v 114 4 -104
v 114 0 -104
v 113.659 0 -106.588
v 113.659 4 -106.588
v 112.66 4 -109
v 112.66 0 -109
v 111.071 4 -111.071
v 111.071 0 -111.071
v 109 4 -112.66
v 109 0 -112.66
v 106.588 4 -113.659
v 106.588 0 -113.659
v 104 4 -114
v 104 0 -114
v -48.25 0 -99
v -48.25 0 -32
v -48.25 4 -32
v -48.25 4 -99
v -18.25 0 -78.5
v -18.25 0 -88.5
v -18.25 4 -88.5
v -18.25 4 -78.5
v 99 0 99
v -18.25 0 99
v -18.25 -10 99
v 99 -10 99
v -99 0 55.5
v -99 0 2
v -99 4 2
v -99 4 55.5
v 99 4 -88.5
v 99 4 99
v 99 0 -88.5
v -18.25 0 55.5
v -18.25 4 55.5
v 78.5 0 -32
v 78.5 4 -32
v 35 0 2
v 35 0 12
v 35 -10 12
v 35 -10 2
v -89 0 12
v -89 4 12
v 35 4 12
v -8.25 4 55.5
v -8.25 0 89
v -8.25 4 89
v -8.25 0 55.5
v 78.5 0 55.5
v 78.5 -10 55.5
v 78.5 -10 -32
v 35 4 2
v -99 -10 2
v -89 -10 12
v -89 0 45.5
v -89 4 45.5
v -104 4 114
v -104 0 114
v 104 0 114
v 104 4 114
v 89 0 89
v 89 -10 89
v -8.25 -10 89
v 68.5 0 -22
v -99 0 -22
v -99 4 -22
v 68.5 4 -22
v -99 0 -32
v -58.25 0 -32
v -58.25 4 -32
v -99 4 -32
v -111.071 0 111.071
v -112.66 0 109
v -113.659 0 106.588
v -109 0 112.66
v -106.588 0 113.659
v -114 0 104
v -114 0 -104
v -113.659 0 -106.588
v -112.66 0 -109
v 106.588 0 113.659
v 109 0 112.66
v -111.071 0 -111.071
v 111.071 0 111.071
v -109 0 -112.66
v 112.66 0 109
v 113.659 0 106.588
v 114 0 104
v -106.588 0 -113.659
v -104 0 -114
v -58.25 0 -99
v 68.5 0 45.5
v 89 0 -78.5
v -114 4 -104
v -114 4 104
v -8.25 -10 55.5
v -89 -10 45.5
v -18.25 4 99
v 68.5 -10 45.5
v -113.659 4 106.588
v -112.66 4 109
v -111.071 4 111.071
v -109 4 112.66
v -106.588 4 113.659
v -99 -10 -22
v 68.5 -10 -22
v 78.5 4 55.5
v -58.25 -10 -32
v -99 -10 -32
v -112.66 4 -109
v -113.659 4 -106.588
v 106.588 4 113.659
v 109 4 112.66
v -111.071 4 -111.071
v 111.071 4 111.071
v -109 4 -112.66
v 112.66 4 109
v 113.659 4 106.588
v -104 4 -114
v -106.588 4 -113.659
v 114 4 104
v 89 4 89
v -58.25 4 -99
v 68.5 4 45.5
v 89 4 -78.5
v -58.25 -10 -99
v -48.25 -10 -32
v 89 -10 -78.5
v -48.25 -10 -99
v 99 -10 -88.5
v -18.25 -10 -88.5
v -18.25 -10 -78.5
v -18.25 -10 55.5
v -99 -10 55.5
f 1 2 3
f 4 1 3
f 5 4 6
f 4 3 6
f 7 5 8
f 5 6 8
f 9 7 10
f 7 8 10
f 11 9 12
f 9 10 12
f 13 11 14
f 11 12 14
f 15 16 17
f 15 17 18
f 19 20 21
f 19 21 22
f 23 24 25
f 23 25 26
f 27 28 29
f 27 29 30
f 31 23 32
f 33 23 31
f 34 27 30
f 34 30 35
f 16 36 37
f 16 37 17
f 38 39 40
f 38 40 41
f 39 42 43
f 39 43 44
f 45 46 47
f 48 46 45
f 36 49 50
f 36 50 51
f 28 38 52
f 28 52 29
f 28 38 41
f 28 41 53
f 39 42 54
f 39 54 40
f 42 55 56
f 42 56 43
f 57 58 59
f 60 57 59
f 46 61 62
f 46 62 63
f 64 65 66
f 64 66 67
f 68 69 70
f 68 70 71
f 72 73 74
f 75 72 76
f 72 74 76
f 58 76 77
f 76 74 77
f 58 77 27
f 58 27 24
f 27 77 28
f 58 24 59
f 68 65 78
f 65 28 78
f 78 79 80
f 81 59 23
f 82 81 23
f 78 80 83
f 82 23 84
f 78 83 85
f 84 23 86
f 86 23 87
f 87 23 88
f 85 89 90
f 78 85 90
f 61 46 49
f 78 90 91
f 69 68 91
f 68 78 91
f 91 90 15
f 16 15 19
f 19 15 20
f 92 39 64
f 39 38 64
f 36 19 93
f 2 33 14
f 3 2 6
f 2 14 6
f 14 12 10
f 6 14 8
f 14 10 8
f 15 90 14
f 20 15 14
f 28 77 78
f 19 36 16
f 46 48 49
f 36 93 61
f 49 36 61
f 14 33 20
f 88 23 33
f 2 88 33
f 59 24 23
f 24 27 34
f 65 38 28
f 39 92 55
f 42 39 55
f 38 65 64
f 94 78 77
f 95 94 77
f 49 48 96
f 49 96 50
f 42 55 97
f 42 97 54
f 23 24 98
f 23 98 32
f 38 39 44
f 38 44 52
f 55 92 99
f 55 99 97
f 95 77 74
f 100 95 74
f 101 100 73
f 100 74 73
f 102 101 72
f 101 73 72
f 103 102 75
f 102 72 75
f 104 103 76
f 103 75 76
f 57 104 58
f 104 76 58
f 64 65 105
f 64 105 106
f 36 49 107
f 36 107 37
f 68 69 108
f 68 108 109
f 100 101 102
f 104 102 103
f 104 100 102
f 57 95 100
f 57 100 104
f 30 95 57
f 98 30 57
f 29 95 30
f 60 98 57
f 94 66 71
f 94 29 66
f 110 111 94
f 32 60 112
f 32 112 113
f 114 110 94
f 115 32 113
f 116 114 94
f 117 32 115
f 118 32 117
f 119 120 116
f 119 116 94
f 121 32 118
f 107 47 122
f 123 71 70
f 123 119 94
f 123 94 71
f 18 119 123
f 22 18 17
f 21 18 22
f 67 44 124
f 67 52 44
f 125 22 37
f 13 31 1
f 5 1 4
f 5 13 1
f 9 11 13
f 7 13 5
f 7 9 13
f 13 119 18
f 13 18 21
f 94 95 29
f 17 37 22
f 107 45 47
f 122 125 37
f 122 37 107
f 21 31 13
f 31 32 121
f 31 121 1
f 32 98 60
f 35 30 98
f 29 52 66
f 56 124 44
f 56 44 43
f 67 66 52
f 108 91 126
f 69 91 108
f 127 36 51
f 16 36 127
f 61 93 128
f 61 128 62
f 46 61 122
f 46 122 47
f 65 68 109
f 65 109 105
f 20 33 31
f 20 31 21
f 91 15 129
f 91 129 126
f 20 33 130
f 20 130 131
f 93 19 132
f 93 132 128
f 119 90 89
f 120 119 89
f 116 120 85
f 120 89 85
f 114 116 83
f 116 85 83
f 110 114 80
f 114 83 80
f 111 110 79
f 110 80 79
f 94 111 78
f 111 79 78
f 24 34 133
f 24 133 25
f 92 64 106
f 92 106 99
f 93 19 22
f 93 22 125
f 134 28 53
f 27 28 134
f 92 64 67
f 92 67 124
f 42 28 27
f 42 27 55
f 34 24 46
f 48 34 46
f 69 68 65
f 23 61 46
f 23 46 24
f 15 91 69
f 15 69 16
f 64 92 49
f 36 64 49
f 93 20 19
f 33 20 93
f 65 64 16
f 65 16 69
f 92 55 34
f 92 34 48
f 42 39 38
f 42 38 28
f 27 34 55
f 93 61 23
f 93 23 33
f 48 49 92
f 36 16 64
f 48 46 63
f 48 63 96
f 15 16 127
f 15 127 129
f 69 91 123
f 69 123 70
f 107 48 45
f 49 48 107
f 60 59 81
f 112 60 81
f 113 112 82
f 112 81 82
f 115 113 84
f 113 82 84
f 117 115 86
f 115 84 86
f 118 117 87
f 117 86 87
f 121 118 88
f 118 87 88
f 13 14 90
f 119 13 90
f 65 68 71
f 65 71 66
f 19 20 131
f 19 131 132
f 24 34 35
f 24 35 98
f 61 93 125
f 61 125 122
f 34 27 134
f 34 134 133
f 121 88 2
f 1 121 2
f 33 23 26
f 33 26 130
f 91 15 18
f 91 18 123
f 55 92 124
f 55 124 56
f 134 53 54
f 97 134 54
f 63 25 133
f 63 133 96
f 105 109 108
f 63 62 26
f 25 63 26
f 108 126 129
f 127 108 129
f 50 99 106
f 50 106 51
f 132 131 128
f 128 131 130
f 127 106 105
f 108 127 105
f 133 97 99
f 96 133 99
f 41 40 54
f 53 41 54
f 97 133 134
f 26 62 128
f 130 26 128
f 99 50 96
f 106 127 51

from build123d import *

# Parameters (mm, degrees)
BOSS_EXTRUDE1_DEPTH = 4
CUT_EXTRUDE3_DEPTH  = 12
BOSS_EXTRUDE6_DEPTH = 10


with BuildPart() as part:
    # Sketch1 → Boss-Extrude1 (new body)
    with BuildSketch(Plane(origin=(0, 0, 0), x_dir=(1, 0, 0), z_dir=(0, 1, 0))):
        with BuildLine():
            Line((-104, -114), (104, -114))
            ThreePointArc((104, -114), (111.071067812, -111.071067812), (114, -104))
            Line((114, -104), (114, 104))
            ThreePointArc((114, 104), (111.071067812, 111.071067812), (104, 114))
            Line((104, 114), (-104, 114))
            ThreePointArc((-104, 114), (-111.071067812, 111.071067812), (-114, 104))
            Line((-114, 104), (-114, -104))
            ThreePointArc((-114, -104), (-111.071067812, -111.071067812), (-104, -114))
        make_face()
    extrude(amount=BOSS_EXTRUDE1_DEPTH)

    # Sketch4 → Cut-Extrude3 (cut)
    with BuildSketch(Plane(origin=(0, 0, 0), x_dir=(1, 0, 0), z_dir=(0, 1, 0))):
        Polygon((-58.25, 99), (-58.25, 32), (-99, 32), (-99, 22), (68.5, 22), (68.5, -45.5), (-89, -45.5), (-89, -12), (35, -12), (35, -2), (-99, -2), (-99, -55.5), (-18.25, -55.5), (-18.25, -99), (99, -99), (99, 88.5), (-18.25, 88.5), (-18.25, 78.5), (89, 78.5), (89, -89), (-8.25, -89), (-8.25, -55.5), (78.5, -55.5), (78.5, 32), (-48.25, 32), (-48.25, 99), align=None)
    extrude(amount=CUT_EXTRUDE3_DEPTH, mode=Mode.SUBTRACT)


with BuildPart() as body_2:
    # Sketch4<5> → Boss-Extrude6 (new body)
    with BuildSketch(Plane(origin=(0, 0, 0), x_dir=(1, 0, 0), z_dir=(0, 1, 0))):
        Polygon((-58.25, 99), (-58.25, 32), (-99, 32), (-99, 22), (68.5, 22), (68.5, -45.5), (-89, -45.5), (-89, -12), (35, -12), (35, -2), (-99, -2), (-99, -55.5), (-18.25, -55.5), (-18.25, -99), (99, -99), (99, 88.5), (-18.25, 88.5), (-18.25, 78.5), (89, 78.5), (89, -89), (-8.25, -89), (-8.25, -55.5), (78.5, -55.5), (78.5, 32), (-48.25, 32), (-48.25, 99), align=None)
    extrude(amount=-BOSS_EXTRUDE6_DEPTH)


solid = Compound([part.part, body_2.part])
